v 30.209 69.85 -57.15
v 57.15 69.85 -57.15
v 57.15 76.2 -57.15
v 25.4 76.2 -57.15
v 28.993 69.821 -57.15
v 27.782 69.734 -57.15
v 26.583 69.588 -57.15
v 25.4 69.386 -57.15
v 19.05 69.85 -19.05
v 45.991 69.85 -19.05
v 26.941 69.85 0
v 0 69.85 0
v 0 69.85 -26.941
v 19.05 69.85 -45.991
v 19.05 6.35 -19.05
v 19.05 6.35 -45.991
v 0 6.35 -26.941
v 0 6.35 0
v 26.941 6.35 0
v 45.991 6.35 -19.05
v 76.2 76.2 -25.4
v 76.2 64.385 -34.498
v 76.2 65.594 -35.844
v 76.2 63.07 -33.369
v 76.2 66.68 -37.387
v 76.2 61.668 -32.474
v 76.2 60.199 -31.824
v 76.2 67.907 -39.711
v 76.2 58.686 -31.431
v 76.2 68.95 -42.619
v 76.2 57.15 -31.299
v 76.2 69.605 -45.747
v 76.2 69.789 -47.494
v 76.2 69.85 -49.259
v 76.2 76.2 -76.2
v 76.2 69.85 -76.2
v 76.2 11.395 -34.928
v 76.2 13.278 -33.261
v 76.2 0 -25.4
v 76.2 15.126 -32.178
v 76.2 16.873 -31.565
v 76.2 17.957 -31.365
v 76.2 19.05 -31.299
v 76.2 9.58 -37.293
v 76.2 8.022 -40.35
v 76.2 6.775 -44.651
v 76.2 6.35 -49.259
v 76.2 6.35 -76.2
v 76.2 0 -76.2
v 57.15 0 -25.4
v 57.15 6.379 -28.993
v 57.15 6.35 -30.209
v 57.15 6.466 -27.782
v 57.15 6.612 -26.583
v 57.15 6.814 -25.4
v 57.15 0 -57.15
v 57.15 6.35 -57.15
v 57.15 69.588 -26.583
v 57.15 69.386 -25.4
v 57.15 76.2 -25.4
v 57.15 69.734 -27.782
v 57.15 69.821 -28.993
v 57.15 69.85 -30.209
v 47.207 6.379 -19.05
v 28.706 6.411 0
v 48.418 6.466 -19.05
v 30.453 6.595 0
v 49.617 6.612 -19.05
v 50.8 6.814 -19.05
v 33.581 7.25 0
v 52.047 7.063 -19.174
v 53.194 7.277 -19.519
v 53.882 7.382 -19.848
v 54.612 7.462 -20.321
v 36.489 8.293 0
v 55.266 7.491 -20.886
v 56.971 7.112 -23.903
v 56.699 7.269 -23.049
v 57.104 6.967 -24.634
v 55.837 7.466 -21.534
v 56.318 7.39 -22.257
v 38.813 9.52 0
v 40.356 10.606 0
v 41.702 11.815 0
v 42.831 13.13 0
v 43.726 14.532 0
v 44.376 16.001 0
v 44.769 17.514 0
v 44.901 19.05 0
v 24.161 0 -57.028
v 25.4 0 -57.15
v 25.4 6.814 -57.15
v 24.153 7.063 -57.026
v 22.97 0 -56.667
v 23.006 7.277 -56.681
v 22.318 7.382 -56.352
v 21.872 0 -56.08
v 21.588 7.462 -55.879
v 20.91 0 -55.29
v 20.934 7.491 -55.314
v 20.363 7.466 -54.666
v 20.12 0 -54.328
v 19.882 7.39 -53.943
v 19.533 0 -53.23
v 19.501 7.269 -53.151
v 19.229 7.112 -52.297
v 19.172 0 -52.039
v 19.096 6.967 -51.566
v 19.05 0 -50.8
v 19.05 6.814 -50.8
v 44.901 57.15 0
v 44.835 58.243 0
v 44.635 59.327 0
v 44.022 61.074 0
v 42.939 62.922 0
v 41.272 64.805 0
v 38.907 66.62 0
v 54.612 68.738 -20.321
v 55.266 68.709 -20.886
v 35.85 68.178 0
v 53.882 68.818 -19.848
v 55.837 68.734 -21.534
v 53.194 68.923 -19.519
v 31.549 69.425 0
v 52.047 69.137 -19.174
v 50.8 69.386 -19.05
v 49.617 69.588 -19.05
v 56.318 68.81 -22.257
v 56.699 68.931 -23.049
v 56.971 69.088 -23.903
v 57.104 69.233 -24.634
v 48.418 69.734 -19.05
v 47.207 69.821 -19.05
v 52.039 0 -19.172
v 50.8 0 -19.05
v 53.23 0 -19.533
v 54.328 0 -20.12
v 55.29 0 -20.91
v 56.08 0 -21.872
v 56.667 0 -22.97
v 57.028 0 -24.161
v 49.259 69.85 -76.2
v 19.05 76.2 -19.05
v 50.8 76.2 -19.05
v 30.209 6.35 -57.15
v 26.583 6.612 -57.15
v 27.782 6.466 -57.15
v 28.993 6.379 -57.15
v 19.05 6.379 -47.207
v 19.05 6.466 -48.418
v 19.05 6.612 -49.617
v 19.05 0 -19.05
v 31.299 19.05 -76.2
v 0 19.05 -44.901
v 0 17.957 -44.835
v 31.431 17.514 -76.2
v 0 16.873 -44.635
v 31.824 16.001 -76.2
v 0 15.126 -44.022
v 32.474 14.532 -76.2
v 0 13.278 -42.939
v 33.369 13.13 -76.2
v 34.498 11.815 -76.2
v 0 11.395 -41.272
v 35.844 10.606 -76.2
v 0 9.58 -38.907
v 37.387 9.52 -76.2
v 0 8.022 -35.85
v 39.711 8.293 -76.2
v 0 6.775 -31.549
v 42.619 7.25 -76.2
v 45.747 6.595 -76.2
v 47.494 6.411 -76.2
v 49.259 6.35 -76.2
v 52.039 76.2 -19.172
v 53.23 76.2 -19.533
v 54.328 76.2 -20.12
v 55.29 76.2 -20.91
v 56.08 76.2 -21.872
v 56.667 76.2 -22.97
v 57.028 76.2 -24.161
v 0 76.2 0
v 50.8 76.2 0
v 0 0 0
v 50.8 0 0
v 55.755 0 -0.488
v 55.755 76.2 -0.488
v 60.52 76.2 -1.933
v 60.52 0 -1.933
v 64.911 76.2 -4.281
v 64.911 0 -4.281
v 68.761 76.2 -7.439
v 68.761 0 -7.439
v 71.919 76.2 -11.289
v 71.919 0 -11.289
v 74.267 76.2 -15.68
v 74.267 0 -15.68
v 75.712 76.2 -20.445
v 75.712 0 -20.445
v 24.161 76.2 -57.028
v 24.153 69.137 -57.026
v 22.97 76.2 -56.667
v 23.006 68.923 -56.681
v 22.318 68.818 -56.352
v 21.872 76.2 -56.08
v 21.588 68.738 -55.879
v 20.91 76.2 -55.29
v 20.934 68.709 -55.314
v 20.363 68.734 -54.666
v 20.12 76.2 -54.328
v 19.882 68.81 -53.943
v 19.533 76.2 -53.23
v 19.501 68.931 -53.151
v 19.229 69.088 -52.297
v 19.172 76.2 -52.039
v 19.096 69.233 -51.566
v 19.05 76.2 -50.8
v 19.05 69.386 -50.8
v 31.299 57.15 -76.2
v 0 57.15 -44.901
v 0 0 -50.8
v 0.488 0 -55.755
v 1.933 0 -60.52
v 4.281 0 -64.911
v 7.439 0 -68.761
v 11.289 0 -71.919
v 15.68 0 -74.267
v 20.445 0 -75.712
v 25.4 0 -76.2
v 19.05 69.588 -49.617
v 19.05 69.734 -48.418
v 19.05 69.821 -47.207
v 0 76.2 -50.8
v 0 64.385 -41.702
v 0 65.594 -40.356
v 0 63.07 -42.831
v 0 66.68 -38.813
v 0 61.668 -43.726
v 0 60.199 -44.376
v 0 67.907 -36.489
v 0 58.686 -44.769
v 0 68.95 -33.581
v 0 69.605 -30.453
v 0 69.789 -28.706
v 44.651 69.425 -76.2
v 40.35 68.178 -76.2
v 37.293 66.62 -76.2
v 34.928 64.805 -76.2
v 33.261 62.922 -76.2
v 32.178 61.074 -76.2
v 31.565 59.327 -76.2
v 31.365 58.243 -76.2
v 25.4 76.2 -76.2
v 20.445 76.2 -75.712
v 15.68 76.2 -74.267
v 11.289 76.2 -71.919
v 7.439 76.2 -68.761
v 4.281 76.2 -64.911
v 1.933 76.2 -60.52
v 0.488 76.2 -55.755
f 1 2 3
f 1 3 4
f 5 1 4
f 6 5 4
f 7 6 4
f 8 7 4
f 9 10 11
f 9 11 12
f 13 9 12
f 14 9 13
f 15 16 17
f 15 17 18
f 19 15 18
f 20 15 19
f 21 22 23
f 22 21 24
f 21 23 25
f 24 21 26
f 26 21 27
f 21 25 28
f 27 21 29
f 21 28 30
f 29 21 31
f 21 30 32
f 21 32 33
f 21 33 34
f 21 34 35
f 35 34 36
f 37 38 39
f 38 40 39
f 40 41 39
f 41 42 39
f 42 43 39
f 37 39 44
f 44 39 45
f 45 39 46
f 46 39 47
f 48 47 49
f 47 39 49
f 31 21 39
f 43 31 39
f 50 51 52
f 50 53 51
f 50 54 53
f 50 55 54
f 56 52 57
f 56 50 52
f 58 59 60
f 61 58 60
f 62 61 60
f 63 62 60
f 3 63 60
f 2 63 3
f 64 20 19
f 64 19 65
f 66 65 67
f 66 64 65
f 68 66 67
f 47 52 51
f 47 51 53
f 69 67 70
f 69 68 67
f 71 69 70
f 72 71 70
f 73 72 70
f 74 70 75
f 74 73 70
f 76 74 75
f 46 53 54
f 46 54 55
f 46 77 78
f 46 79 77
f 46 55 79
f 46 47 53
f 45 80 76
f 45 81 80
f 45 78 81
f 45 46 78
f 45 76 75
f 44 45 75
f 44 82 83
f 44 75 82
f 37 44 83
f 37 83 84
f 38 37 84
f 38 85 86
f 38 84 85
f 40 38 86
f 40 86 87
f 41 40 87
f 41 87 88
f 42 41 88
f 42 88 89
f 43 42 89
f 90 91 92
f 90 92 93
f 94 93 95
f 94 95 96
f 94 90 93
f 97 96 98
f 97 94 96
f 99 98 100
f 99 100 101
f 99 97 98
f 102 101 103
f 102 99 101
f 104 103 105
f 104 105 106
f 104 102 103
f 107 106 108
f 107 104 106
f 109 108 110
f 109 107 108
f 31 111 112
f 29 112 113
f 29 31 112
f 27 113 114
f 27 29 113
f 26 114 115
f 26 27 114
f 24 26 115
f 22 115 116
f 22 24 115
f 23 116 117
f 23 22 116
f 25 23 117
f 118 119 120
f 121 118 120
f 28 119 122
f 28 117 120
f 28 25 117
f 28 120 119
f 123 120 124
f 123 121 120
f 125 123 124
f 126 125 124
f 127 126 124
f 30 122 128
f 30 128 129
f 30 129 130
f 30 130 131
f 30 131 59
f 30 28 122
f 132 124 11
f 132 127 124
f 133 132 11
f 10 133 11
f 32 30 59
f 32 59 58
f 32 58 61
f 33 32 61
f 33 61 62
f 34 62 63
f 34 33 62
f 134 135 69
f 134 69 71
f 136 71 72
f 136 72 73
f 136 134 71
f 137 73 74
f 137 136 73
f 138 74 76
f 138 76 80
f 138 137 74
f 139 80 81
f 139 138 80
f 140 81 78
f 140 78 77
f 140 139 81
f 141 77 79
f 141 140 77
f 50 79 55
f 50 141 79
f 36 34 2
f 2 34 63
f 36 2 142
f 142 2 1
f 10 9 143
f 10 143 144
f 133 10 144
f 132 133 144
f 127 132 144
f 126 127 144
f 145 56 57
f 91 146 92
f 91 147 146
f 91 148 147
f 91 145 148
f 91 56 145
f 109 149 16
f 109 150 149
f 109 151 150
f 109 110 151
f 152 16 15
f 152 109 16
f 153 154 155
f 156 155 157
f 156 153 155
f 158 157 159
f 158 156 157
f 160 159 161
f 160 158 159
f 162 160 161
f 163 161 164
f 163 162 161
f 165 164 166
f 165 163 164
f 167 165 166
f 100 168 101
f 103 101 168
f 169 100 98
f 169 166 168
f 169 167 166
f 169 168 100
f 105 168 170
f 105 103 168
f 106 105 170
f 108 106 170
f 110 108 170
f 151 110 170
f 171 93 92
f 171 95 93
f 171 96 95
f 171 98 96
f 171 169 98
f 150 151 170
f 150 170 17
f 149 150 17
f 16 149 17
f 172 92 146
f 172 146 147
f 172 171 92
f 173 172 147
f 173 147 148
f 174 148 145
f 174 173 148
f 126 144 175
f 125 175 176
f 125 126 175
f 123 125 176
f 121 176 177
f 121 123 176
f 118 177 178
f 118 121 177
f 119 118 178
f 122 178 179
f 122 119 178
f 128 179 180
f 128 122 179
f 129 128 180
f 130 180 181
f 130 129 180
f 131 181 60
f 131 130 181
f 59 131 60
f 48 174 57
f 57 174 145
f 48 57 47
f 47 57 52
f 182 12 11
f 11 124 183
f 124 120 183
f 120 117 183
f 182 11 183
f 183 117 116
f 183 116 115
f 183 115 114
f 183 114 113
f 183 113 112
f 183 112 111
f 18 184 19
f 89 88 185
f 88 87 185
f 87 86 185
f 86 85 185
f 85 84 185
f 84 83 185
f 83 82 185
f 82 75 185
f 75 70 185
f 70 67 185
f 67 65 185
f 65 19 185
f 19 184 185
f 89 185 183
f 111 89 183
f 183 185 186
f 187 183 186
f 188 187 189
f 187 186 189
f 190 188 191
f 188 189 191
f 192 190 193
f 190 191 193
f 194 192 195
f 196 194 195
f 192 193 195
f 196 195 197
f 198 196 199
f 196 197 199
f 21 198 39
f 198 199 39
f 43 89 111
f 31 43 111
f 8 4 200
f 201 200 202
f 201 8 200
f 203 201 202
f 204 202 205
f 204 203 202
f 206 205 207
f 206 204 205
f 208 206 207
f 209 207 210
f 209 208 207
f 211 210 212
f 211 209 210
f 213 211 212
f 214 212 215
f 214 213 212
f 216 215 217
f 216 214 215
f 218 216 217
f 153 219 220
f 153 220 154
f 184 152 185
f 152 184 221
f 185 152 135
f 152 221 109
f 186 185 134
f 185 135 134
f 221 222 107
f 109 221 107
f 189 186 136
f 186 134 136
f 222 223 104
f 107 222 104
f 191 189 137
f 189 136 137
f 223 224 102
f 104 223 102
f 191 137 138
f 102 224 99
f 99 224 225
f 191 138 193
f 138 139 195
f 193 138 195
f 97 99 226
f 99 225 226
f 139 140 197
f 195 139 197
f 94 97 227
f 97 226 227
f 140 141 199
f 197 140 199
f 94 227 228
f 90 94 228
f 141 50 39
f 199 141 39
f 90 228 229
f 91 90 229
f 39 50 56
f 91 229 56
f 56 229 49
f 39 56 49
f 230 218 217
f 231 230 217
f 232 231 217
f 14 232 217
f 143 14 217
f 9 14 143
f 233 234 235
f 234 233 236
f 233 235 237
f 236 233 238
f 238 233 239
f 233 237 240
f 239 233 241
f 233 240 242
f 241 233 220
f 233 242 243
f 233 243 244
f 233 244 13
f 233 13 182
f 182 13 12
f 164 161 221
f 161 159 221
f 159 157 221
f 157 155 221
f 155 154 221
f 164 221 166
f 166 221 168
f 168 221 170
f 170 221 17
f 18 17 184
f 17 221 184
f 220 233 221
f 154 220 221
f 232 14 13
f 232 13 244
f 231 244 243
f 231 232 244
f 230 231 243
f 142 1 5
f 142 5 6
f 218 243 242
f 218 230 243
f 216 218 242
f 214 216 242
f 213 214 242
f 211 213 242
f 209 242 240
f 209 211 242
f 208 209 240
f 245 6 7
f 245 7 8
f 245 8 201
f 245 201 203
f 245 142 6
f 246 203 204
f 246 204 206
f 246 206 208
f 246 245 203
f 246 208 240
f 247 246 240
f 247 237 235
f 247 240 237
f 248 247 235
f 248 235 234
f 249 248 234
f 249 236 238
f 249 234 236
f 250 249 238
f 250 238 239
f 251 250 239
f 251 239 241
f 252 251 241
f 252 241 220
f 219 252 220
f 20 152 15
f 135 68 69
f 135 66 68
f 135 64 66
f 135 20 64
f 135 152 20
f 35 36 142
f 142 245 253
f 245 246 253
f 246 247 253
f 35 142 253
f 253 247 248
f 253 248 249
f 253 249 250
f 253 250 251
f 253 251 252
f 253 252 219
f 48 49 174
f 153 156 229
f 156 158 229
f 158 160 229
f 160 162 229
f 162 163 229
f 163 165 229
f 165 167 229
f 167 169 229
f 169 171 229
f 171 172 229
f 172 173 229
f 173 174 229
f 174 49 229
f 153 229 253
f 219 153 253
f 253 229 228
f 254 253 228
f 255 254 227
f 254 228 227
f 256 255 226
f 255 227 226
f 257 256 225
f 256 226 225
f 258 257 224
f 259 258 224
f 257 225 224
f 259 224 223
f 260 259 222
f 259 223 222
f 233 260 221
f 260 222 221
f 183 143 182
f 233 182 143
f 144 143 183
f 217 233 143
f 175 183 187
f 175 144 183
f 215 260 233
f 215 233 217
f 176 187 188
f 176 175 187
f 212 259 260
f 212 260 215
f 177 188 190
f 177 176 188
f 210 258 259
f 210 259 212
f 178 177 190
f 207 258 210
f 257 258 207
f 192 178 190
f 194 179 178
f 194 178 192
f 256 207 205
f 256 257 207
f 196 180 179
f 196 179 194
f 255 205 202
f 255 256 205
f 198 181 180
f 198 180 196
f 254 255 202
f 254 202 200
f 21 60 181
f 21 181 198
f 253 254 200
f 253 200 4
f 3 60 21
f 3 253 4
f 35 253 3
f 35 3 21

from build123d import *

# Parameters (mm, degrees)
BOSS_EXTRUDE1_DEPTH     = 76.2
CUT_EXTRUDE4_DEPTH      = 50.546
CUT_EXTRUDE4_DEPTH_BACK = 82.042


with BuildPart() as part:
    # Sketch1 → Boss-Extrude1 (new body)
    with BuildSketch(Plane(origin=(0, 0, 0), x_dir=(1, 0, 0), z_dir=(0, 1, 0))):
        with BuildLine():
            Line((0, 0), (50.8, 0))
            ThreePointArc((50.8, 0), (68.760512242, 7.439487758), (76.2, 25.4))
            Line((76.2, 25.4), (76.2, 76.2))
            Line((76.2, 76.2), (25.4, 76.2))
            ThreePointArc((25.4, 76.2), (7.439487758, 68.760512242), (0, 50.8))
            Line((0, 50.8), (0, 0))
        make_face()
        with BuildLine():
            Line((19.05, 19.05), (50.8, 19.05))
            ThreePointArc((50.8, 19.05), (55.290128061, 20.909871939), (57.15, 25.4))
            Line((57.15, 25.4), (57.15, 57.15))
            Line((57.15, 57.15), (25.4, 57.15))
            ThreePointArc((25.4, 57.15), (20.909871939, 55.290128061), (19.05, 50.8))
            Line((19.05, 50.8), (19.05, 19.05))
        make_face(mode=Mode.SUBTRACT)
    extrude(amount=BOSS_EXTRUDE1_DEPTH)

    # Sketch3 → Cut-Extrude4 (cut, two sides)
    with BuildSketch(Plane(origin=(25.4, 0, -25.4), x_dir=(0.707106781, 0, 0.707106781), z_dir=(-0.707106781, 0, 0.707106781))) as cut_extrude4_sk:
        with BuildLine():
            Line((-31.75, 38.1), (-31.75, 19.05))
            ThreePointArc((-31.75, 19.05), (-28.030256121, 10.069743879), (-19.05, 6.35))
            Line((-19.05, 6.35), (19.05, 6.35))
            ThreePointArc((19.05, 6.35), (28.030256121, 10.069743879), (31.75, 19.05))
            Line((31.75, 19.05), (31.75, 38.1))
            Line((31.75, 38.1), (31.75, 57.15))
            ThreePointArc((31.75, 57.15), (28.030256121, 66.130256121), (19.05, 69.85))
            Line((19.05, 69.85), (-19.05, 69.85))
            ThreePointArc((-19.05, 69.85), (-28.030256121, 66.130256121), (-31.75, 57.15))
            Line((-31.75, 57.15), (-31.75, 38.1))
        make_face()
    extrude(amount=CUT_EXTRUDE4_DEPTH, mode=Mode.SUBTRACT)
    extrude(cut_extrude4_sk.sketch, amount=-CUT_EXTRUDE4_DEPTH_BACK, mode=Mode.SUBTRACT)


solid = part.part
